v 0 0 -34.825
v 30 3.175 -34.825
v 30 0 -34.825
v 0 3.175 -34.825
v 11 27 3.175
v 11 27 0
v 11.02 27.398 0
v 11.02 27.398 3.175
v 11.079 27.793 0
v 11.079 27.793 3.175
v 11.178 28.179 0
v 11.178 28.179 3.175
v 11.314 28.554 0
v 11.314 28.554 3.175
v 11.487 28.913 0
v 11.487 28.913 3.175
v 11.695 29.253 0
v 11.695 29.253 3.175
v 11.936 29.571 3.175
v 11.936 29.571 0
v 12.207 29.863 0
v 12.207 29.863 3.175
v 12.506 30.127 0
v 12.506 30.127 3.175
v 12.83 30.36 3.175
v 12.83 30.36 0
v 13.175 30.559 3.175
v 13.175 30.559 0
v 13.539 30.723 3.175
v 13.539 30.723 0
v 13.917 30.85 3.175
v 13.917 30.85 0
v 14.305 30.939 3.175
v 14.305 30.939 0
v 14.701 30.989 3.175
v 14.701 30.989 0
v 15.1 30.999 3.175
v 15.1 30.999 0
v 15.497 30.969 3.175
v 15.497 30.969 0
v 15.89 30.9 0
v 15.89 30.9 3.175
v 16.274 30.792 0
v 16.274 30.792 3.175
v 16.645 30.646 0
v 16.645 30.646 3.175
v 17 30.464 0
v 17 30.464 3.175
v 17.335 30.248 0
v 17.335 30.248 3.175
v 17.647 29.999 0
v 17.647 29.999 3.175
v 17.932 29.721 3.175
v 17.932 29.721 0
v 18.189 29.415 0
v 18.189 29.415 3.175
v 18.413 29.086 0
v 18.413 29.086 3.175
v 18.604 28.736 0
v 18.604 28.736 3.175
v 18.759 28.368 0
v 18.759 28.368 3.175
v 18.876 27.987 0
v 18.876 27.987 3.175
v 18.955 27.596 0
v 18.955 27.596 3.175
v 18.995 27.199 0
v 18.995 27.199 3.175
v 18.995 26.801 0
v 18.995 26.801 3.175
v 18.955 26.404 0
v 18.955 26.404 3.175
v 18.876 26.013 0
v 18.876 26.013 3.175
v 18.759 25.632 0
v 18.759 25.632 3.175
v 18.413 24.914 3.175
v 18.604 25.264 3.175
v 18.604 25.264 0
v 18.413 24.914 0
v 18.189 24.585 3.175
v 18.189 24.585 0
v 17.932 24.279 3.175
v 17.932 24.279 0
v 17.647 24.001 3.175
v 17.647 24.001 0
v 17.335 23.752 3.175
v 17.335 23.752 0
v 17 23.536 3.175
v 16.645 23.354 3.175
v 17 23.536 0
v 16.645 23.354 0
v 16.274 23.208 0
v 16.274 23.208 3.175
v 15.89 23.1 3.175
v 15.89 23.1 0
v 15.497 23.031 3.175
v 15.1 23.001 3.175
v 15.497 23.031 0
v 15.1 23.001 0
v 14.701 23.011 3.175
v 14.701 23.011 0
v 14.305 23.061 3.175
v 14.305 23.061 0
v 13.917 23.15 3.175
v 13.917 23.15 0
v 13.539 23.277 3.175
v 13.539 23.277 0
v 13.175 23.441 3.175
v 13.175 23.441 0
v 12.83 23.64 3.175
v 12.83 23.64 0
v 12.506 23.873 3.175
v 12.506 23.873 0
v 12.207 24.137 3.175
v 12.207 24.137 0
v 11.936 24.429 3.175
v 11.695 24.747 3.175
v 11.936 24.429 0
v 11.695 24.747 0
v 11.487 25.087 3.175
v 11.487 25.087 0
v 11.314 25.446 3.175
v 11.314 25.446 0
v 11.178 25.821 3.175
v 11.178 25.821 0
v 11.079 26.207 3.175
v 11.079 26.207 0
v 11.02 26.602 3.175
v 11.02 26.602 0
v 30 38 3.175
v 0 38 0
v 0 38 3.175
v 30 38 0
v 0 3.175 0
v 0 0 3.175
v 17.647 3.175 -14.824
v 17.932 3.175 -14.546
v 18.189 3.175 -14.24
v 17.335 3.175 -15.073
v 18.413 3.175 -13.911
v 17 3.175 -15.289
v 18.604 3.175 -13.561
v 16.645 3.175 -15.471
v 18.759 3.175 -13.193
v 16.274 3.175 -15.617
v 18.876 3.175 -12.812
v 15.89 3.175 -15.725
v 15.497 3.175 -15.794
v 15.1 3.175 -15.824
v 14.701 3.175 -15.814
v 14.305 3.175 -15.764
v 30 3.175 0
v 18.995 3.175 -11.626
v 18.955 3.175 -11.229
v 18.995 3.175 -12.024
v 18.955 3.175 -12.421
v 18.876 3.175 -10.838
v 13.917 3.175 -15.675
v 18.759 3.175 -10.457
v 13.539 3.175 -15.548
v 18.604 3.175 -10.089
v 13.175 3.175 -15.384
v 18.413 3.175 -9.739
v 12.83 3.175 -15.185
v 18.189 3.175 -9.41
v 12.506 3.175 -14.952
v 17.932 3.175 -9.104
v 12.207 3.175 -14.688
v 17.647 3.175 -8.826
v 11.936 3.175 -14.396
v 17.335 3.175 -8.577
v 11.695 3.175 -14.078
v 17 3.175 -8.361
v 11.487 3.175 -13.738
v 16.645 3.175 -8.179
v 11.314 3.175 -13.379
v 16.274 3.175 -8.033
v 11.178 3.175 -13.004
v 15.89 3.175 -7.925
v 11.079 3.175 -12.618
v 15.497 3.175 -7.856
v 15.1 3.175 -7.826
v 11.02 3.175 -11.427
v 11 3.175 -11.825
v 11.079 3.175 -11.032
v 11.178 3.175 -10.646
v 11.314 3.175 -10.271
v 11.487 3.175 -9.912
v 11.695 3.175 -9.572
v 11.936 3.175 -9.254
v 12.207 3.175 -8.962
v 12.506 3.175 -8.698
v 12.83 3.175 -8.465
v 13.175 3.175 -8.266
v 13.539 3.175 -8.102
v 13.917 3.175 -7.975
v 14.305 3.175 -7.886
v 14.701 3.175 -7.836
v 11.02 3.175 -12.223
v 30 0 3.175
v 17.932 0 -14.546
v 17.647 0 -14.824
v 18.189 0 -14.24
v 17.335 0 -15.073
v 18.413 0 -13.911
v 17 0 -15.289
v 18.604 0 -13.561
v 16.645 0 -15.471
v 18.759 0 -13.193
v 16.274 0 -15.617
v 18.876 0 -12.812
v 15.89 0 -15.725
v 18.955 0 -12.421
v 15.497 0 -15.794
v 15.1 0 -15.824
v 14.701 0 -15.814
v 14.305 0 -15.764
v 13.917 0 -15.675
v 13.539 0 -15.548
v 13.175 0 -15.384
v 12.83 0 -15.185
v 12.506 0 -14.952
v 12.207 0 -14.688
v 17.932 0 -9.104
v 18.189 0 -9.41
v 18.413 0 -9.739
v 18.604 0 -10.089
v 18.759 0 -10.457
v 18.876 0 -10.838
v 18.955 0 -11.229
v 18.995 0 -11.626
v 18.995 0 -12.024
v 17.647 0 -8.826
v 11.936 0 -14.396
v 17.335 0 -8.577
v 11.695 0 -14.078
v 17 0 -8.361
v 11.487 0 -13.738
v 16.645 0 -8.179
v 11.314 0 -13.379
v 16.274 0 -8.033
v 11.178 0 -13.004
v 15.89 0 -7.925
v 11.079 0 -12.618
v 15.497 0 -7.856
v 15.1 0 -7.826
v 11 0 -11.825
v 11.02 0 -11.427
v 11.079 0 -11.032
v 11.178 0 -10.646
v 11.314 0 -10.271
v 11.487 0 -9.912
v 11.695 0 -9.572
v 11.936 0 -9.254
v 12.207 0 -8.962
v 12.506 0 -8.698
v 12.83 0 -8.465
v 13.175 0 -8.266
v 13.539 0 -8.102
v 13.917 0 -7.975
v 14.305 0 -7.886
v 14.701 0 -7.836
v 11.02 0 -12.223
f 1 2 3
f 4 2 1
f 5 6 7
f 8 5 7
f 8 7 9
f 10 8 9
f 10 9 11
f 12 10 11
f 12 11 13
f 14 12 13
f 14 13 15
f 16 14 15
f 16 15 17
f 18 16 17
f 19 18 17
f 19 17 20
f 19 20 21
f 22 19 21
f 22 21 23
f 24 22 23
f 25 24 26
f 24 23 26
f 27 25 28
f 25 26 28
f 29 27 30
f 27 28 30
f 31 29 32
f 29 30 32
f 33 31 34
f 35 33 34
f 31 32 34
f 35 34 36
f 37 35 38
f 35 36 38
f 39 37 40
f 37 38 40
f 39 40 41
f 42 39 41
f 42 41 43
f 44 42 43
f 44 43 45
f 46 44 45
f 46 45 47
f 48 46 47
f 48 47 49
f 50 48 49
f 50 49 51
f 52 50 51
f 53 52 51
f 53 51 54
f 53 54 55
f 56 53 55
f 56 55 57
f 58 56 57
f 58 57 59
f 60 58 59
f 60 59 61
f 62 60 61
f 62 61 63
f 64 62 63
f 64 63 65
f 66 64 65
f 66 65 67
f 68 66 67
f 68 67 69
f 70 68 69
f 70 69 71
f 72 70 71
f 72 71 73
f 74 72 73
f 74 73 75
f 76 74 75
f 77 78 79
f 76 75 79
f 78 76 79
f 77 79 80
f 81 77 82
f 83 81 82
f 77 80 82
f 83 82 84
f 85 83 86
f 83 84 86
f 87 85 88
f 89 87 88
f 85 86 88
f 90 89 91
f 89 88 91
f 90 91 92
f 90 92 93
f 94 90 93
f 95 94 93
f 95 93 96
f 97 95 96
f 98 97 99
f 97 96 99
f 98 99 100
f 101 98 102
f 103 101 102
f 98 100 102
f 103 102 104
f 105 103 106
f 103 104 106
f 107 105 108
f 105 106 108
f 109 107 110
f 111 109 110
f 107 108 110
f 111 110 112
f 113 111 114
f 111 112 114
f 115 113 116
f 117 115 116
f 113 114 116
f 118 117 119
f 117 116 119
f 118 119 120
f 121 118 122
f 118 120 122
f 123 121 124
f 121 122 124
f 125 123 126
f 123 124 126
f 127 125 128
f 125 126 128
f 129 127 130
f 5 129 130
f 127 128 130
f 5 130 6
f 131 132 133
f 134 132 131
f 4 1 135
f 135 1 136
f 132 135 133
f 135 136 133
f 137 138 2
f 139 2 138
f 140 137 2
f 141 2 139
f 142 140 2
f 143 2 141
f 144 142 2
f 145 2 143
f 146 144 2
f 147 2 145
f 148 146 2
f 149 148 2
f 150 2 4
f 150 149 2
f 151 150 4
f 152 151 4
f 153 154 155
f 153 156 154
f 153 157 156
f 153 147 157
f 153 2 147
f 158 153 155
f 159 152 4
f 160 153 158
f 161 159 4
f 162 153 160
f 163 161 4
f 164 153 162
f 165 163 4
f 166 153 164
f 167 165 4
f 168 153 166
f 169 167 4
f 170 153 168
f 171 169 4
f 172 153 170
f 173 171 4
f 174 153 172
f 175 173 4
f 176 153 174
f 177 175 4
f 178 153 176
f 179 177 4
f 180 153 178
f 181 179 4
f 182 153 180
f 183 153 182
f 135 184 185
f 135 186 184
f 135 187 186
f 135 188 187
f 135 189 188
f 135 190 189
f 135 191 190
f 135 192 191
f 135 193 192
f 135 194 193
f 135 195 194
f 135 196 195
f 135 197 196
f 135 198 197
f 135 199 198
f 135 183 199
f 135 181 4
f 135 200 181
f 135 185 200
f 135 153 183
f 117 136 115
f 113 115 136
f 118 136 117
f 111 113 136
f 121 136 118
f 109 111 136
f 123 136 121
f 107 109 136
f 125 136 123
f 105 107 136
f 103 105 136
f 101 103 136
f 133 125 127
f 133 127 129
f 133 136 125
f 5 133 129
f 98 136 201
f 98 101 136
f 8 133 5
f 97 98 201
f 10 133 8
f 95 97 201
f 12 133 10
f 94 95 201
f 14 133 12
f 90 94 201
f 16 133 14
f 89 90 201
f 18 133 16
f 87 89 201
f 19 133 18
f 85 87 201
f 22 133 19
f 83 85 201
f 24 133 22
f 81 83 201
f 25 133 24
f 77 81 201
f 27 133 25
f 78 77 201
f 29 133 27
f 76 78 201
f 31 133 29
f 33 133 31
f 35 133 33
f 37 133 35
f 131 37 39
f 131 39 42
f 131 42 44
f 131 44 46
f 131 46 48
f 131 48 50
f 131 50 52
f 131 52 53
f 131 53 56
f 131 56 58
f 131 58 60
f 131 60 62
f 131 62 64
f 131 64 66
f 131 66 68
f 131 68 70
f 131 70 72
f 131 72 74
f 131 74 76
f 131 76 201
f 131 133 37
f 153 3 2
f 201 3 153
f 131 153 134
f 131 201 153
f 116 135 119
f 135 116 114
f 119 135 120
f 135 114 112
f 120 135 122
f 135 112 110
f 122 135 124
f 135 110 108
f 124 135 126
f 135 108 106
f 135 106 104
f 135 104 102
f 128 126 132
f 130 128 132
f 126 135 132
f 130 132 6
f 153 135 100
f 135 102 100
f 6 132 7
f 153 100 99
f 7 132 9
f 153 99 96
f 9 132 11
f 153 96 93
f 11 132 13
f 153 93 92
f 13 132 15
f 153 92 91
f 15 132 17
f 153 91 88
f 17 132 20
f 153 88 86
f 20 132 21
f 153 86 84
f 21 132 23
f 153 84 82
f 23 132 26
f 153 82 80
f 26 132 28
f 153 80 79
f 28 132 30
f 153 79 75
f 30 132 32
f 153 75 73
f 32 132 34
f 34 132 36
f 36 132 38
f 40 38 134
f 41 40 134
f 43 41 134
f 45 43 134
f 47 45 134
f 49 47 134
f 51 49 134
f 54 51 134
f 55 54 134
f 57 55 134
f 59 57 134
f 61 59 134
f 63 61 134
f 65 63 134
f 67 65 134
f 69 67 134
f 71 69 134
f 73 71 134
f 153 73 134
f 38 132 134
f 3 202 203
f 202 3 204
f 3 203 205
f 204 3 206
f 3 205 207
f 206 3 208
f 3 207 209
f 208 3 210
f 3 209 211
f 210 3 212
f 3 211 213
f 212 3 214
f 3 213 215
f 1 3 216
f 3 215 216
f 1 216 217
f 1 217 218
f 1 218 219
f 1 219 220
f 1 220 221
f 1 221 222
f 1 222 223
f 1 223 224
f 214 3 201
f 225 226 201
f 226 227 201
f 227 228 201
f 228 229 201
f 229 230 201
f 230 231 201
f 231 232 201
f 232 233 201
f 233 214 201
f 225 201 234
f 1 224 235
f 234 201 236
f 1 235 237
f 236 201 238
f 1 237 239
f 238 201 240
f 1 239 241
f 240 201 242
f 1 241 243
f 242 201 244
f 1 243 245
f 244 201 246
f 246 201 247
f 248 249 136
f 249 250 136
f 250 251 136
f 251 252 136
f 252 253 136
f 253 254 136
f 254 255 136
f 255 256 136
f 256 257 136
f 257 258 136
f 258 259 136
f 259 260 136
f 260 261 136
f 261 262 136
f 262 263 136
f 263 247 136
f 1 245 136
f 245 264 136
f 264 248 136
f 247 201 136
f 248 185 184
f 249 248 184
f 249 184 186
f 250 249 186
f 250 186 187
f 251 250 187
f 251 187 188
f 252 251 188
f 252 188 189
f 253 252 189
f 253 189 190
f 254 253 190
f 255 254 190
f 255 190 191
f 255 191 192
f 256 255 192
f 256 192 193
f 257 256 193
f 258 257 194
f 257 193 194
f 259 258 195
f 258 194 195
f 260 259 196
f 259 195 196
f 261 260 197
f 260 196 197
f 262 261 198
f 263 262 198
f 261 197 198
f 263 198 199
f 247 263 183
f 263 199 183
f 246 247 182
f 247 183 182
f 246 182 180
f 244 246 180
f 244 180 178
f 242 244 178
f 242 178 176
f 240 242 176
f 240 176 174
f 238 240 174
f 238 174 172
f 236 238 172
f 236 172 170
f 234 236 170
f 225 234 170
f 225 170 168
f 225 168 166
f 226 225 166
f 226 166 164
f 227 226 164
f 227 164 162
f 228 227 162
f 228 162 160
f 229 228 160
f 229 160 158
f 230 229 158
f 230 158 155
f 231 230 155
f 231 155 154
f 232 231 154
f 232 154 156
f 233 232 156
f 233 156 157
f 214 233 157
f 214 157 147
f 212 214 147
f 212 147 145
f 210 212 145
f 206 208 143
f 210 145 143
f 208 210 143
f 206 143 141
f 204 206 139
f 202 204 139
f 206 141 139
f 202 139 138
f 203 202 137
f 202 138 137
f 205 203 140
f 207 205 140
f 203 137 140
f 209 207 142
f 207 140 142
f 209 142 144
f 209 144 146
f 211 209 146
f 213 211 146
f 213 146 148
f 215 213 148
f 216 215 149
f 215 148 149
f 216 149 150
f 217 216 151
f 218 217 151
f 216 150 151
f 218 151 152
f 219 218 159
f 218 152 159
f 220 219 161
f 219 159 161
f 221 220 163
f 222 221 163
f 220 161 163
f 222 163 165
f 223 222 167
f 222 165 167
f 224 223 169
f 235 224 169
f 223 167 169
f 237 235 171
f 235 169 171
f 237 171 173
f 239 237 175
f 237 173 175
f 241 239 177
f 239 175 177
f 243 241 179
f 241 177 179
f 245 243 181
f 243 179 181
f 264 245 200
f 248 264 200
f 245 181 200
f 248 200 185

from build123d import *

# Parameters (mm, degrees)
SKETCH1_W           = 30
SKETCH1_H           = 38
BOSS_EXTRUDE1_DEPTH = 3.175
SKETCH2_W           = 30
SKETCH2_H           = 3.175
BOSS_EXTRUDE2_DEPTH = 34.825
SKETCH3_R           = 4
CUT_EXTRUDE1_DEPTH  = 60.638751035
SKETCH4_R           = 4
CUT_EXTRUDE2_DEPTH  = 58.667679423


with BuildPart() as part:
    # Sketch1 → Boss-Extrude1 (new body)
    with BuildSketch(Plane.XY):
        with Locations((15, 19)):
            Rectangle(SKETCH1_W, SKETCH1_H)
    extrude(amount=BOSS_EXTRUDE1_DEPTH)

    # Sketch2 → Boss-Extrude2 (add)
    with BuildSketch(Plane(origin=(0, 0, 0), x_dir=(-1, 0, 0), z_dir=(0, 0, -1))):
        with Locations((-15, 1.5875)):
            Rectangle(SKETCH2_W, SKETCH2_H)
    extrude(amount=BOSS_EXTRUDE2_DEPTH)

    # Sketch3 → Cut-Extrude1 (cut, through all)
    with BuildSketch(Plane(origin=(0, 0, 0), x_dir=(-1, 0, 0), z_dir=(0, 0, -1))):
        with Locations((-15, 27)):
            Circle(SKETCH3_R)
    extrude(amount=-CUT_EXTRUDE1_DEPTH, mode=Mode.SUBTRACT)

    # Sketch4 → Cut-Extrude2 (cut, through all)
    with BuildSketch(Plane(origin=(0, 3.175, 0), x_dir=(1, 0, 0), z_dir=(0, 1, 0))):
        with Locations(Location((15, 11.825, 0), (0, 0, 180))):
            Circle(SKETCH4_R)
    extrude(amount=-CUT_EXTRUDE2_DEPTH, mode=Mode.SUBTRACT)


solid = part.part
